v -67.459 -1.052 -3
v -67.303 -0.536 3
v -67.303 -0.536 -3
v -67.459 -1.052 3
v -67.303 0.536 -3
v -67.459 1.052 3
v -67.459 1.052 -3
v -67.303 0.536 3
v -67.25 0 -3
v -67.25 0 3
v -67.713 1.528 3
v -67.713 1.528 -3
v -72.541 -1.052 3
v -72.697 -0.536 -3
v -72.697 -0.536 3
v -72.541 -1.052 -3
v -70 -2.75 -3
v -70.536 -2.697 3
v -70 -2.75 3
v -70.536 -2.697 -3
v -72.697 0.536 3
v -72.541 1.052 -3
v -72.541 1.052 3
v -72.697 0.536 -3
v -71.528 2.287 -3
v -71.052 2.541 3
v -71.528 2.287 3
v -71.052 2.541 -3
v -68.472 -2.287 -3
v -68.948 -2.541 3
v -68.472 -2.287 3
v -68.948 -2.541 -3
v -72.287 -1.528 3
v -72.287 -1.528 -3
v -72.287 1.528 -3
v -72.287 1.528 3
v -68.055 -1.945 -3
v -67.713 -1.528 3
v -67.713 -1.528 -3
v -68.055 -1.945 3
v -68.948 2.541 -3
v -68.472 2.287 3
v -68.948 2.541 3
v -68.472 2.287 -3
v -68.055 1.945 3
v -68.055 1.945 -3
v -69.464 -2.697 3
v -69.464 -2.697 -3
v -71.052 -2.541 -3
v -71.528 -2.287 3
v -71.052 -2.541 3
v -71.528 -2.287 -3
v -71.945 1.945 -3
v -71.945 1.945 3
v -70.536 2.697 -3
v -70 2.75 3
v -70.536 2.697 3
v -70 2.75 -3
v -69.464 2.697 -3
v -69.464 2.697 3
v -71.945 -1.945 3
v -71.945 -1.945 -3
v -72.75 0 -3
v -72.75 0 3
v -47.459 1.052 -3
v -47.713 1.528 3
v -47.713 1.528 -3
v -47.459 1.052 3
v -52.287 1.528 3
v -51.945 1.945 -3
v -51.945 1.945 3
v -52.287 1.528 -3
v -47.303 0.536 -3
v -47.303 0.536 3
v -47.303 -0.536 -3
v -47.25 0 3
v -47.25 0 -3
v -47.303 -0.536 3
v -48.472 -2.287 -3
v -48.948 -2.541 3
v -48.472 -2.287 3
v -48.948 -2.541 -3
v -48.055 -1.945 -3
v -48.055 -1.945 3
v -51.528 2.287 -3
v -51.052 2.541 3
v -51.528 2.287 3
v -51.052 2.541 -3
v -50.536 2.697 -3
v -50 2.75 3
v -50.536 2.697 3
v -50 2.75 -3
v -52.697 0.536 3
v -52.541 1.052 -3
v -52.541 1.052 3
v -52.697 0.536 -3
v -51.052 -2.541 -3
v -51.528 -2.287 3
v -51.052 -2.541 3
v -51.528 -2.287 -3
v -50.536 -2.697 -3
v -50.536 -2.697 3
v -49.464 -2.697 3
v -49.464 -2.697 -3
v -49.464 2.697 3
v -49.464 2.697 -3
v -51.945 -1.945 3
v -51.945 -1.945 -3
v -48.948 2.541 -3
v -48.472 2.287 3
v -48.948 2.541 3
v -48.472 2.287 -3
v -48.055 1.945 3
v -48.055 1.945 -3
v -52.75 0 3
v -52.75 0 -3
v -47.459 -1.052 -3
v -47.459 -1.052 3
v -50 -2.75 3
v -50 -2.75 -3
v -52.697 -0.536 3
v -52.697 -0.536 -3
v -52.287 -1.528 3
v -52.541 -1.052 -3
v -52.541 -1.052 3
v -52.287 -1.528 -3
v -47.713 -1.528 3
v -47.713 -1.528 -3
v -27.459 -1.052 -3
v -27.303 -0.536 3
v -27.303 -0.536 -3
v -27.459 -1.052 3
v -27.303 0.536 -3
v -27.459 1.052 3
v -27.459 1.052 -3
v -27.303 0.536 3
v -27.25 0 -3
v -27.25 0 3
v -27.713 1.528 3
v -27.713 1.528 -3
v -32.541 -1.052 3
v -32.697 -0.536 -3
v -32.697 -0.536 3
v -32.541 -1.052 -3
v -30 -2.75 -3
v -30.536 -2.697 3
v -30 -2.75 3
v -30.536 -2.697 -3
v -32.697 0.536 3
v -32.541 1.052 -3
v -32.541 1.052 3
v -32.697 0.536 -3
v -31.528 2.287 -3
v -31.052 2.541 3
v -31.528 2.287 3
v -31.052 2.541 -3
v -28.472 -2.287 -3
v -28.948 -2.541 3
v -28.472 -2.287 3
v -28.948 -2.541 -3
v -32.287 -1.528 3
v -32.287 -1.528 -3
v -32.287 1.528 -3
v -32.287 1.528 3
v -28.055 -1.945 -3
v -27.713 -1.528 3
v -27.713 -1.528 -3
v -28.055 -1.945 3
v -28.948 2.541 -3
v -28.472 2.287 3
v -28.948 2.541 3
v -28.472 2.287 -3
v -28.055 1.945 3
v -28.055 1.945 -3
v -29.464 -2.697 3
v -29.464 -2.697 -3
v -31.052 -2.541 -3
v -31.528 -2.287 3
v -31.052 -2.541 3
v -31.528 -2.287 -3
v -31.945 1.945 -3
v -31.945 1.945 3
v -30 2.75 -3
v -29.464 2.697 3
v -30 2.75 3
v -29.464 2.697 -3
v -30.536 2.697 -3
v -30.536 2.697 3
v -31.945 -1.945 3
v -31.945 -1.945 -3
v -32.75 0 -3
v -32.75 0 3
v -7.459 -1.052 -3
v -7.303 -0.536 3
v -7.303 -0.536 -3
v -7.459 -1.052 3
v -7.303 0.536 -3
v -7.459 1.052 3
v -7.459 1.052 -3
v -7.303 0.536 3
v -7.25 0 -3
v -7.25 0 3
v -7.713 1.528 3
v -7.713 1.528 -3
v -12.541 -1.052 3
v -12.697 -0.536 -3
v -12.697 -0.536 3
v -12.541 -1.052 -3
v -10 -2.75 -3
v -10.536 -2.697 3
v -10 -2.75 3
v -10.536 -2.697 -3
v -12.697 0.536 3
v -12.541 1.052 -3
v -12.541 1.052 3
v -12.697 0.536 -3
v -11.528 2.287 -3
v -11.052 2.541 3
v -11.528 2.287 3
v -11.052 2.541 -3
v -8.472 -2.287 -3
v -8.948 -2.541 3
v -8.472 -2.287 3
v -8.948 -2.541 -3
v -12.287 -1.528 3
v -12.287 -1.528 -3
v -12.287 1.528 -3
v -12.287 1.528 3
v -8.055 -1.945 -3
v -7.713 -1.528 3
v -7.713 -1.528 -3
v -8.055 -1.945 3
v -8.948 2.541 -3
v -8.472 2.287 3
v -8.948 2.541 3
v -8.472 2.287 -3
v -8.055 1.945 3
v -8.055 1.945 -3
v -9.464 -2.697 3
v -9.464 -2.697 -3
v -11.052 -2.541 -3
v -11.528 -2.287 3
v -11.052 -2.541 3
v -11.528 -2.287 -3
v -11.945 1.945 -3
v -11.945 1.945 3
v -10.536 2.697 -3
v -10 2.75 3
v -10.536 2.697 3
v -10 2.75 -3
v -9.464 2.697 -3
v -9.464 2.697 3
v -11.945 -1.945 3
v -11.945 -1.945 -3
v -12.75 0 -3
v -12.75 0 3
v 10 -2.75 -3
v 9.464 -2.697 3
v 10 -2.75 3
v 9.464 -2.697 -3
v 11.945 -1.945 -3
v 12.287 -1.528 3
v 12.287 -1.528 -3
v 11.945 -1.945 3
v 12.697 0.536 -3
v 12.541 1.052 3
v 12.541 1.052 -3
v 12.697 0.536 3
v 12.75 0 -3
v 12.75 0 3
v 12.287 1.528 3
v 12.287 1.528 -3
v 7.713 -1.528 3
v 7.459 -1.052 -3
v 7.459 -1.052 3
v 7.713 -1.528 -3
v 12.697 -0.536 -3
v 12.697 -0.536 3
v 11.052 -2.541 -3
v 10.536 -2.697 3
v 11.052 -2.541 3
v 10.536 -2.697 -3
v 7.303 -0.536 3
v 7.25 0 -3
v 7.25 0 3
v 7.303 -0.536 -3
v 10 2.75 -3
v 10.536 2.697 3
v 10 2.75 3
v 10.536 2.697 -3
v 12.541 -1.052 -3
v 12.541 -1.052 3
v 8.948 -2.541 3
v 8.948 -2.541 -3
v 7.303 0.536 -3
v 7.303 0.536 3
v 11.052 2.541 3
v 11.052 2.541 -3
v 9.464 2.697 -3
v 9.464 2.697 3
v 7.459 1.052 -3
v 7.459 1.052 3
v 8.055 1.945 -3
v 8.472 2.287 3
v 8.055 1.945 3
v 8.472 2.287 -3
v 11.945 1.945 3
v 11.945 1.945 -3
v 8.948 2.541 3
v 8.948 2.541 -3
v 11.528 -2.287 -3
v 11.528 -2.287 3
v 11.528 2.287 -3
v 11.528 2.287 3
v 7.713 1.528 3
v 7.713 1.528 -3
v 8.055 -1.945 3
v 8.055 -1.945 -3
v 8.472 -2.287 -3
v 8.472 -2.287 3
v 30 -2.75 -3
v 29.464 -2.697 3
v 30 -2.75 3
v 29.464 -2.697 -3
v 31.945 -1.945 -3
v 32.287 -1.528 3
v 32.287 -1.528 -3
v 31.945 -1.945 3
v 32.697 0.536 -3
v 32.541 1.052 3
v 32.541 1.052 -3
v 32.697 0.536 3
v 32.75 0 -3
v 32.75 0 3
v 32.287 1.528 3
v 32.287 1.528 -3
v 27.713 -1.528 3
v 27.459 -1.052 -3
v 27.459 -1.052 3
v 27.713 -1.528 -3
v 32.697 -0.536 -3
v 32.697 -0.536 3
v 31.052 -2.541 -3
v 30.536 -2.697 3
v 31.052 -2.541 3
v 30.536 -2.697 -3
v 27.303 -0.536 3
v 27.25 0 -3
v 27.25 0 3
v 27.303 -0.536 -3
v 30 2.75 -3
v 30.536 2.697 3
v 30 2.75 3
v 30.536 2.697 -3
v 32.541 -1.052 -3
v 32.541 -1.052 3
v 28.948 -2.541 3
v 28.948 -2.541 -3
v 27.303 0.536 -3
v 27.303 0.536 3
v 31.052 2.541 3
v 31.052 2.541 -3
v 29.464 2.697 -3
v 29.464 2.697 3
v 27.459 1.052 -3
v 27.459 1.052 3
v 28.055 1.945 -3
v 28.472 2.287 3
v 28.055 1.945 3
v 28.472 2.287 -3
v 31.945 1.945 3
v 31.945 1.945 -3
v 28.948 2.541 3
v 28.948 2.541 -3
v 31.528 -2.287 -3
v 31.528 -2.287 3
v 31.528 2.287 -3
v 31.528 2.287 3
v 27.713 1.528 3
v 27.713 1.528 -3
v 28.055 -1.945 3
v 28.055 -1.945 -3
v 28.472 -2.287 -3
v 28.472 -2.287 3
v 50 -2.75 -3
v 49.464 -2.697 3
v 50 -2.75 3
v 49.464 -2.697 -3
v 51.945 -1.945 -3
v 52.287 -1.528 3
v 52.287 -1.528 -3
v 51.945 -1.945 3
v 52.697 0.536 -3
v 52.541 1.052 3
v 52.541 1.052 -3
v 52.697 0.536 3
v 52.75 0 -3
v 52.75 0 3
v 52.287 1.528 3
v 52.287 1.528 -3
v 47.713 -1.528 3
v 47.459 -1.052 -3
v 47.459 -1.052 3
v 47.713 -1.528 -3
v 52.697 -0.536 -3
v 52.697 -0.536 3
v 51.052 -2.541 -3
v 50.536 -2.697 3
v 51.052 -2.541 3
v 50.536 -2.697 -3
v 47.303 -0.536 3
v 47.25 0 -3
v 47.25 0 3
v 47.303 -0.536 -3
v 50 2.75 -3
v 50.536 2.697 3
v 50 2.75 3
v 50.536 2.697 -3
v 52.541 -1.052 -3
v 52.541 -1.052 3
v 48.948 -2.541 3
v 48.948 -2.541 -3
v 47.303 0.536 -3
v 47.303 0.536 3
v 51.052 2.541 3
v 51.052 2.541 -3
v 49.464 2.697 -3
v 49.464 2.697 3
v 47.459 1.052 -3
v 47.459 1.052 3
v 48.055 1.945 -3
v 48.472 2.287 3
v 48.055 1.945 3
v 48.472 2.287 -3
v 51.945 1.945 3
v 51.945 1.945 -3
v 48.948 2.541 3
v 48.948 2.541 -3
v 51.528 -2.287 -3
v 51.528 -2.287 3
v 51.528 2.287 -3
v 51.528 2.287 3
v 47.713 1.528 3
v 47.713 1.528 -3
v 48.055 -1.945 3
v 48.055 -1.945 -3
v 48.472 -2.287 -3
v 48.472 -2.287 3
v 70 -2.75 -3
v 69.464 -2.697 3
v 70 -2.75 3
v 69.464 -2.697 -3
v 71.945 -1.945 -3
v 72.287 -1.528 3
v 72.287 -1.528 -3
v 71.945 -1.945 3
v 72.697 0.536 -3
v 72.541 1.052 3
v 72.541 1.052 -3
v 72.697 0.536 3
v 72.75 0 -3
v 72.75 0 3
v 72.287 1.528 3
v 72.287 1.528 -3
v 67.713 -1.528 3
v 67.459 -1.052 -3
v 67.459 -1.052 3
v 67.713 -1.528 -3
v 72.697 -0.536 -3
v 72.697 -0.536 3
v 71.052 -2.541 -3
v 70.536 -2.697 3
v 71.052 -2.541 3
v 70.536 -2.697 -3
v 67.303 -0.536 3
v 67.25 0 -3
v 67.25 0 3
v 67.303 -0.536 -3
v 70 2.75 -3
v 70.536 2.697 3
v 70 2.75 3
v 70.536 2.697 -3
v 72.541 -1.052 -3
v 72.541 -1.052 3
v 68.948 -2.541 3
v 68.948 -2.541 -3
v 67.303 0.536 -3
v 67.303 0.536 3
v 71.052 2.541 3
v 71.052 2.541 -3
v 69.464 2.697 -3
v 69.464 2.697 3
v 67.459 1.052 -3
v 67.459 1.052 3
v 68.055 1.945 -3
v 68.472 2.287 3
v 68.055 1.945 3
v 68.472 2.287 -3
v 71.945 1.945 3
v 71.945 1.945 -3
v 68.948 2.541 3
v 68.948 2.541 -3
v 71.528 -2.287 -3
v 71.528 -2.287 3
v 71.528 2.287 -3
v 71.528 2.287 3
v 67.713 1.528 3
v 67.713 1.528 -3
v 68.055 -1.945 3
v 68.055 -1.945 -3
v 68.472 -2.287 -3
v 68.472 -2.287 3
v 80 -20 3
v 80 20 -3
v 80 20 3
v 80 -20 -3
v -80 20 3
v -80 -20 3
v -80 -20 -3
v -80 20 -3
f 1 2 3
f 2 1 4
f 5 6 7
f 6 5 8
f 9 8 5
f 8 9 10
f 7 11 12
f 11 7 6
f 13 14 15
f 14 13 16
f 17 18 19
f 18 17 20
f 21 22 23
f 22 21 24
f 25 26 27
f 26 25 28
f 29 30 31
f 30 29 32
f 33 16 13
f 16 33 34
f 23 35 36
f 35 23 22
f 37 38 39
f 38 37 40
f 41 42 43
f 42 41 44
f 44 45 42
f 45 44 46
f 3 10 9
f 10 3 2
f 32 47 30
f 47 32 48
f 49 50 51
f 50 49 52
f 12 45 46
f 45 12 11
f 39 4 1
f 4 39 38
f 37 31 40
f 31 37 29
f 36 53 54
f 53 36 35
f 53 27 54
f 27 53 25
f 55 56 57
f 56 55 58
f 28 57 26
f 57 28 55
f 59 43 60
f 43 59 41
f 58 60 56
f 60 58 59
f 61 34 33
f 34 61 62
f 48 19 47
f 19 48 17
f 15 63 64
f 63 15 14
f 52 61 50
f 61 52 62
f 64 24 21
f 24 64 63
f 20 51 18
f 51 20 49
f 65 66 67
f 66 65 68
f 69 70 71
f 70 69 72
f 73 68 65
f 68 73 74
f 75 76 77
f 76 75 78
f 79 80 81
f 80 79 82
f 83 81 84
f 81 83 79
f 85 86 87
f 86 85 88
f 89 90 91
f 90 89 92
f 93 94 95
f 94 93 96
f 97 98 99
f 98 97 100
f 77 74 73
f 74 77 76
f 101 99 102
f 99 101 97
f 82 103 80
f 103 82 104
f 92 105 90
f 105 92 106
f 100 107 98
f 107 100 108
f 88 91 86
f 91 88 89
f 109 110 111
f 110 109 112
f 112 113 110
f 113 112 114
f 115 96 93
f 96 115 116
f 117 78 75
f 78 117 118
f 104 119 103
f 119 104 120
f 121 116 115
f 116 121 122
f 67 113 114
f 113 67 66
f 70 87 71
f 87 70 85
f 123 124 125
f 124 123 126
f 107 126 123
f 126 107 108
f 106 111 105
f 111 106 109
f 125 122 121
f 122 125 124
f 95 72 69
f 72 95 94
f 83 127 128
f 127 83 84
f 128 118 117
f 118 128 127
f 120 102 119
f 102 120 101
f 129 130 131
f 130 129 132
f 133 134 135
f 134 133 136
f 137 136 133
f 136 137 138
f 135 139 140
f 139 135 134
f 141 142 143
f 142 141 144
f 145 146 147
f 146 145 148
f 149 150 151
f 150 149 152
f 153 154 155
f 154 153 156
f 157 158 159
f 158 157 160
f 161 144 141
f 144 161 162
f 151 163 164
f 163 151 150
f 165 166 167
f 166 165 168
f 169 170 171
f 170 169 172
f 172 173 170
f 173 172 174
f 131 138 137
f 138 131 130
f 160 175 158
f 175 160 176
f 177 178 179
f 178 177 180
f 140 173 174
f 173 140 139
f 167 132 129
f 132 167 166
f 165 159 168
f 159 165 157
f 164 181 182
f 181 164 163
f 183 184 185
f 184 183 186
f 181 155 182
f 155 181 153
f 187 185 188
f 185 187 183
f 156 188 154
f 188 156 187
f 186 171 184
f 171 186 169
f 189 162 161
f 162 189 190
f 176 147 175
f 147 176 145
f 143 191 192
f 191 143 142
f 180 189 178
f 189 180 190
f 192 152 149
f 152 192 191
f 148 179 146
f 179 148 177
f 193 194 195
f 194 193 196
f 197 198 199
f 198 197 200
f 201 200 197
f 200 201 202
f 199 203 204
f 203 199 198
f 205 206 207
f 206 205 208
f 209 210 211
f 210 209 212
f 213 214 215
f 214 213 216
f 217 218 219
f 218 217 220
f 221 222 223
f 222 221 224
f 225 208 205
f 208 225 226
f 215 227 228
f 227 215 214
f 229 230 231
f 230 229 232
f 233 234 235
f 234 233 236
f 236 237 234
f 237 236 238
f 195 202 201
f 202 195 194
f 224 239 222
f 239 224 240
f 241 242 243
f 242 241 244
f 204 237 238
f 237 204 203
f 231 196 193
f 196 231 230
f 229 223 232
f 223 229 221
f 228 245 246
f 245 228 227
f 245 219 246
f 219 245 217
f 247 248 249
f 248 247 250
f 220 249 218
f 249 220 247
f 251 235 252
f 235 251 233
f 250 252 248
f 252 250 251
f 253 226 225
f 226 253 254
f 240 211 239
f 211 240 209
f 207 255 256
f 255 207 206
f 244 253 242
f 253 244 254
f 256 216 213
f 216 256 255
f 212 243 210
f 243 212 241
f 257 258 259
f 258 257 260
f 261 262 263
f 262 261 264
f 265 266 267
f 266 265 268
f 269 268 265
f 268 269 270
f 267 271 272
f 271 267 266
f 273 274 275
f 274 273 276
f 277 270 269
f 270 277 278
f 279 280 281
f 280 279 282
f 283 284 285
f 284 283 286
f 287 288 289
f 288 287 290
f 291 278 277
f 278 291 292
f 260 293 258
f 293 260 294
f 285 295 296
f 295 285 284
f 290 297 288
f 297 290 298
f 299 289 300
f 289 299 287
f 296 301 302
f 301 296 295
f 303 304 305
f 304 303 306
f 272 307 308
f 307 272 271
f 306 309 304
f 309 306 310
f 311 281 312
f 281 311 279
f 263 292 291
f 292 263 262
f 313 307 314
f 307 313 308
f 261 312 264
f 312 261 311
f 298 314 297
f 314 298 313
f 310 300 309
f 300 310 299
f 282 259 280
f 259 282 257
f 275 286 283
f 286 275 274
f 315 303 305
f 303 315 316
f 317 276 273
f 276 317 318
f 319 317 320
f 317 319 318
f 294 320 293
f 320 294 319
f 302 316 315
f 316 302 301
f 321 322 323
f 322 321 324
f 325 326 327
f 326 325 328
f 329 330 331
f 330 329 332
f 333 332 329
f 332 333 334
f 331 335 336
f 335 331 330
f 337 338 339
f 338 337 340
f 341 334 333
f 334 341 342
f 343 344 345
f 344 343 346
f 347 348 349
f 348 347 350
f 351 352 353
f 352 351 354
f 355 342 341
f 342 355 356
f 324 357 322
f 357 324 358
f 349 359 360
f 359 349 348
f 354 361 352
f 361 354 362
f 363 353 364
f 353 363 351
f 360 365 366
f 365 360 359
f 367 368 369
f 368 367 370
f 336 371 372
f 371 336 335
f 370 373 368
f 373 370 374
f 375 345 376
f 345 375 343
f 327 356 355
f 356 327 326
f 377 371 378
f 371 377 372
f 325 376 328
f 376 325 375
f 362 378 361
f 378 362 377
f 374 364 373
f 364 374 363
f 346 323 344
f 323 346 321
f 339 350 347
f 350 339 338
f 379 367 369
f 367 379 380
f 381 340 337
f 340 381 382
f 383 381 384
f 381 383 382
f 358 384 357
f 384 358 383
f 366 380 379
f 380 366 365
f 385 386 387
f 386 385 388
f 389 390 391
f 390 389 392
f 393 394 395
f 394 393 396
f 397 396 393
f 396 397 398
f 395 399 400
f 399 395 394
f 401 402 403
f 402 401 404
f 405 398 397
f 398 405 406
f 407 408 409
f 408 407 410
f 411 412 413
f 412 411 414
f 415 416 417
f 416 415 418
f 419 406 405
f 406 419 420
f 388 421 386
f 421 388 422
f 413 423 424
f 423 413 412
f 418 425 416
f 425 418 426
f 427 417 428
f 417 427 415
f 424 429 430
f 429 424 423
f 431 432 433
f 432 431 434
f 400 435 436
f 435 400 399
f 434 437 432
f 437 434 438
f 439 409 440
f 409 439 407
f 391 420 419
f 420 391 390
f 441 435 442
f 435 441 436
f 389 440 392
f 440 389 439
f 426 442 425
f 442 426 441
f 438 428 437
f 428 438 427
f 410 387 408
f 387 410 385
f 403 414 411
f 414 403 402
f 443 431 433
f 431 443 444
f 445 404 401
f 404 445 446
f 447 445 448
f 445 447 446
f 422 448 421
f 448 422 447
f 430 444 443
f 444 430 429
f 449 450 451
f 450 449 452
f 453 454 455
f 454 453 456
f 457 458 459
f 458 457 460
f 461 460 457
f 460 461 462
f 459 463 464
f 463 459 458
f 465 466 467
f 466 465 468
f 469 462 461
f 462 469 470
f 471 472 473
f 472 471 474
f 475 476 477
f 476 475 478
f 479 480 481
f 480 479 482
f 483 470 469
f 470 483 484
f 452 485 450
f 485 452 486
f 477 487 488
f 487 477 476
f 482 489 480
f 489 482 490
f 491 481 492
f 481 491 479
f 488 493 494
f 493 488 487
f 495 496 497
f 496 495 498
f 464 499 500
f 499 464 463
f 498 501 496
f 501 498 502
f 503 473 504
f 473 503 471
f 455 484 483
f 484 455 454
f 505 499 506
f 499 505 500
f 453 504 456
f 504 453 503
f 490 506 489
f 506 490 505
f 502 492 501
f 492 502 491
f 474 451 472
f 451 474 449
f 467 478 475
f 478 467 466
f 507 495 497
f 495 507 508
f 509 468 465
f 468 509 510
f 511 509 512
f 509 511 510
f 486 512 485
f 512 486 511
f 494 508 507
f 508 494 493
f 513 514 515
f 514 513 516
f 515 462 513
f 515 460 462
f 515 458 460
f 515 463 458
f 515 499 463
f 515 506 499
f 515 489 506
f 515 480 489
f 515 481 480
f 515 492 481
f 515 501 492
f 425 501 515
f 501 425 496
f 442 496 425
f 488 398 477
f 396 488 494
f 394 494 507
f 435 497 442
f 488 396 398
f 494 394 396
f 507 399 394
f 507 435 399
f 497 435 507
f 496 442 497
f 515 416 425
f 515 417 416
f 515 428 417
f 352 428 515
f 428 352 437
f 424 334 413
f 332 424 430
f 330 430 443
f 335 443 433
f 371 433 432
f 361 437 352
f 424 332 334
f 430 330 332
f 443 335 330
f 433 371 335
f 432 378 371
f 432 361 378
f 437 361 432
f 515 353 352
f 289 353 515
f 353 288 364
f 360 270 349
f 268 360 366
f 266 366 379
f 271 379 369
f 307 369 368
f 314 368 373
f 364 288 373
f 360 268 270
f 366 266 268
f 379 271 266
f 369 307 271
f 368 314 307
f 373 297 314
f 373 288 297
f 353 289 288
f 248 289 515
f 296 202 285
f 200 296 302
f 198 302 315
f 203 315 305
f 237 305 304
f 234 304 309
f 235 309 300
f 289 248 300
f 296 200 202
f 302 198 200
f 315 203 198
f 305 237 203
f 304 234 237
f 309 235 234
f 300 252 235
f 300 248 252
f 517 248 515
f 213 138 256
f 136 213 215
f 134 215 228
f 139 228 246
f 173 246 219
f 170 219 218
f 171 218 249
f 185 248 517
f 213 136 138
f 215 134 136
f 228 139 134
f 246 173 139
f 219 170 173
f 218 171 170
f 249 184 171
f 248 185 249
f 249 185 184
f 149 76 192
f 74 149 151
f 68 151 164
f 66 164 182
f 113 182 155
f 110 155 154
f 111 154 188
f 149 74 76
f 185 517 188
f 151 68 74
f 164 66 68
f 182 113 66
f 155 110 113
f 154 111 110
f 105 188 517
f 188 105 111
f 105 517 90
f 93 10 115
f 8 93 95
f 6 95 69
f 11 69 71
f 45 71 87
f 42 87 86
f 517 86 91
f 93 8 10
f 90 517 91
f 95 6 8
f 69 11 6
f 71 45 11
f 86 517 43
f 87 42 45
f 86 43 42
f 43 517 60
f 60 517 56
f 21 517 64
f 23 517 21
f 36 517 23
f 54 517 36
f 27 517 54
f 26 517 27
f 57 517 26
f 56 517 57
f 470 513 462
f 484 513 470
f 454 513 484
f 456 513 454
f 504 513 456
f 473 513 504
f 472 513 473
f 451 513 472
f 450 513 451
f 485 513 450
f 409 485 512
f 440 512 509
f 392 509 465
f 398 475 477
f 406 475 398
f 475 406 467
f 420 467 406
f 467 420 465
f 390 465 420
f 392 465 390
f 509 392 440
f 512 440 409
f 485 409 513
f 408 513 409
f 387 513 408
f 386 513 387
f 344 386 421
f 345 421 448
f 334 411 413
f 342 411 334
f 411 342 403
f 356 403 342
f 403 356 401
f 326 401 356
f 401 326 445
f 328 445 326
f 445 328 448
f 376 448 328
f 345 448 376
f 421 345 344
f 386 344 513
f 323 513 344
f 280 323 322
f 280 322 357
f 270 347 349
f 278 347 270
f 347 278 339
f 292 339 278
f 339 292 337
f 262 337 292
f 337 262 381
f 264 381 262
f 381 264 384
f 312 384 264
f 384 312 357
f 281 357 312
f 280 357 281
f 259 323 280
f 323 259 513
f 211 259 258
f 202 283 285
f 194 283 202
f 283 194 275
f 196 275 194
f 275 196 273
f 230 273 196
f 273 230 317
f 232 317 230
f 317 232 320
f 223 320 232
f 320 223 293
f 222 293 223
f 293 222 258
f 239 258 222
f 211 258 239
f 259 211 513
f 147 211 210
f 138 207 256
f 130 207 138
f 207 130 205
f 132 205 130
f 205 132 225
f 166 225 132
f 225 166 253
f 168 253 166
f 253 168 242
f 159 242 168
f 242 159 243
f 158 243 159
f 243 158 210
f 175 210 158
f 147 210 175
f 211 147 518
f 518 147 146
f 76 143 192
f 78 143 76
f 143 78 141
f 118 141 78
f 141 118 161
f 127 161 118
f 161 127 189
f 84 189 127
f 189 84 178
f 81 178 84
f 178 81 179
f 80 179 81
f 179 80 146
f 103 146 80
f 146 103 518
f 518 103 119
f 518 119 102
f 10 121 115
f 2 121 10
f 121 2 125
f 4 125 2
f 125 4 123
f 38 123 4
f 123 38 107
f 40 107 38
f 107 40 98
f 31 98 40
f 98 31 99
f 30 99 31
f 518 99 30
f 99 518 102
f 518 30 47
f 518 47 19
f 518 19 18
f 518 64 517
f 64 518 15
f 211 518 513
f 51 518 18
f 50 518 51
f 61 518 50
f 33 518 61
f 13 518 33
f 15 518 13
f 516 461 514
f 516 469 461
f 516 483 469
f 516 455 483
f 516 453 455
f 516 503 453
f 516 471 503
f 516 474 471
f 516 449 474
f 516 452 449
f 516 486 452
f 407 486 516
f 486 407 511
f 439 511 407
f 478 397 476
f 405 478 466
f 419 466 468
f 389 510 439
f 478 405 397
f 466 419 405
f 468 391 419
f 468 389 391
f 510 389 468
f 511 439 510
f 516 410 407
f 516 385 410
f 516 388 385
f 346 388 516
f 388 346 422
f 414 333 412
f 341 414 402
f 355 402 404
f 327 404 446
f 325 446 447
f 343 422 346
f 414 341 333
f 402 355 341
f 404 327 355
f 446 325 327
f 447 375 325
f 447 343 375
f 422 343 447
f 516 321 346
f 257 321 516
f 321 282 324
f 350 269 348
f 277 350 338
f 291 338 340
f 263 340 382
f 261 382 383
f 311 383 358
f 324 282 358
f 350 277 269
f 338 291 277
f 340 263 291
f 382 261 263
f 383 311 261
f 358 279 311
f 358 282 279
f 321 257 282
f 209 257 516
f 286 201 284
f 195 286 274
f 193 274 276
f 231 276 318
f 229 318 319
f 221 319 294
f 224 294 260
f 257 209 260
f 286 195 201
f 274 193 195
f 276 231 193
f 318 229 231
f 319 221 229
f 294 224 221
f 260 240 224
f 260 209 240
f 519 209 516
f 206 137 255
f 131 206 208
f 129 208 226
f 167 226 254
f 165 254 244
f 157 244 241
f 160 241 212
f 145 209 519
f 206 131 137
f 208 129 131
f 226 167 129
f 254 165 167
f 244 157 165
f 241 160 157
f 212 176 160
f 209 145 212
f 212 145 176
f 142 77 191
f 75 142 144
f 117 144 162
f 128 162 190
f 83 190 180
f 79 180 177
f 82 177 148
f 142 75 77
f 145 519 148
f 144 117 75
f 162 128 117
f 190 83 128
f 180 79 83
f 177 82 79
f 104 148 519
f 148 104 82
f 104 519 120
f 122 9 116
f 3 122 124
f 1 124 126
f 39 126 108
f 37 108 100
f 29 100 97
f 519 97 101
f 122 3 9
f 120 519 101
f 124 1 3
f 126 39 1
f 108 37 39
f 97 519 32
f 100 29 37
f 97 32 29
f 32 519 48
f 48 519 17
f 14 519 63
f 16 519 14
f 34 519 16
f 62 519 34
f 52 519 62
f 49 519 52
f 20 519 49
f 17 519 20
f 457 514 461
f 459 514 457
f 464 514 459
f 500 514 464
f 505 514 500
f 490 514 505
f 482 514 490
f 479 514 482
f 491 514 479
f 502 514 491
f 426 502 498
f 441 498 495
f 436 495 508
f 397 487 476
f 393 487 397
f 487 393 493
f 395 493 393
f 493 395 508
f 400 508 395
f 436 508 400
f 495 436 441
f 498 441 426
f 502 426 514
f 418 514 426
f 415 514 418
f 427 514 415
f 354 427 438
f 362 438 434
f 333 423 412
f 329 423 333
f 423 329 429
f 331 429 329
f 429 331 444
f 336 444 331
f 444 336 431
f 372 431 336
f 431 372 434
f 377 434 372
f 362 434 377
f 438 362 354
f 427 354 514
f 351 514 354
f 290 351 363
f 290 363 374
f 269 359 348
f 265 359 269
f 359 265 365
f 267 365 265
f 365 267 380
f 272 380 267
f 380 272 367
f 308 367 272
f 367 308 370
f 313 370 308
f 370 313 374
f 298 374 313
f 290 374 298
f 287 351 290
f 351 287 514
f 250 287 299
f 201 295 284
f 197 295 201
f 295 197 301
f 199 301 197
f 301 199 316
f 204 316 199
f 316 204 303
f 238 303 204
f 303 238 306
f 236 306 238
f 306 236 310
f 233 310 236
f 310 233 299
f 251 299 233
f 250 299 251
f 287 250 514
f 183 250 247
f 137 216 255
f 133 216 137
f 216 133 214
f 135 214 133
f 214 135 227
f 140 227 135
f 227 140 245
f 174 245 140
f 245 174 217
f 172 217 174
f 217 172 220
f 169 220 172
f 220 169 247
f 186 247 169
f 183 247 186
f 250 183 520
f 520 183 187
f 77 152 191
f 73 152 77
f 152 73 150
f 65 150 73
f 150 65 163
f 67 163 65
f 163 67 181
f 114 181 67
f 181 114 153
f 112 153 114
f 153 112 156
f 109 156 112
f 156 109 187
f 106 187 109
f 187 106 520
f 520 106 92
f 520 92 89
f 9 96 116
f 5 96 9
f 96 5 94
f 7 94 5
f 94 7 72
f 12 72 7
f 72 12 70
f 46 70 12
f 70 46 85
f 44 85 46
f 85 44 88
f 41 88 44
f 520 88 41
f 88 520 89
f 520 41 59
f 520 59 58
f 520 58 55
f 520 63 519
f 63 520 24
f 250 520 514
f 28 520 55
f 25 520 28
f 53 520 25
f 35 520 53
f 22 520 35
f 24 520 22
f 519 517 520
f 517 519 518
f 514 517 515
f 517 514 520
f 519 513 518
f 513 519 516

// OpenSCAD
$fn = 32;

// ----------------------------------------------------------------------
// Hole bar, 8 x Ø5.5
// row layout, 10 mm edge offset
// ----------------------------------------------------------------------

// --- parameters (mm) ---
bar_w = 40;    // bar width (Y)
bar_t = 6;     // bar thickness (Z)
holes = 8;     // holes per row
hole_d = 5.5;  // hole diameter
edge = 10;     // offset from the bar end to the first hole
pitch = 20;    // pitch between neighbouring holes

// --- derived feature positions (mm) ---
span = (holes - 1) * pitch;   // = 140   distance between the end holes
bar_l = span + 2 * edge;      // = 160   overall bar length
start_x = -bar_l / 2 + edge;  // = -70   X of the first hole
feature_centers = [
  [start_x + 0 * pitch, 0],
  [start_x + 1 * pitch, 0],
  [start_x + 2 * pitch, 0],
  [start_x + 3 * pitch, 0],
  [start_x + 4 * pitch, 0],
  [start_x + 5 * pitch, 0],
  [start_x + 6 * pitch, 0],
  [start_x + 7 * pitch, 0]
];   // hole centres of the first row

// bar with one row of holes, drilled from feature_centers
difference() {
  translate([-bar_l / 2, -bar_w / 2, -bar_t / 2]) cube([bar_l, bar_w, bar_t]);
  for (centre = feature_centers)
    translate([centre[0], centre[1], 0])
      cylinder(d = hole_d, h = bar_t + 2, center = true);
}
